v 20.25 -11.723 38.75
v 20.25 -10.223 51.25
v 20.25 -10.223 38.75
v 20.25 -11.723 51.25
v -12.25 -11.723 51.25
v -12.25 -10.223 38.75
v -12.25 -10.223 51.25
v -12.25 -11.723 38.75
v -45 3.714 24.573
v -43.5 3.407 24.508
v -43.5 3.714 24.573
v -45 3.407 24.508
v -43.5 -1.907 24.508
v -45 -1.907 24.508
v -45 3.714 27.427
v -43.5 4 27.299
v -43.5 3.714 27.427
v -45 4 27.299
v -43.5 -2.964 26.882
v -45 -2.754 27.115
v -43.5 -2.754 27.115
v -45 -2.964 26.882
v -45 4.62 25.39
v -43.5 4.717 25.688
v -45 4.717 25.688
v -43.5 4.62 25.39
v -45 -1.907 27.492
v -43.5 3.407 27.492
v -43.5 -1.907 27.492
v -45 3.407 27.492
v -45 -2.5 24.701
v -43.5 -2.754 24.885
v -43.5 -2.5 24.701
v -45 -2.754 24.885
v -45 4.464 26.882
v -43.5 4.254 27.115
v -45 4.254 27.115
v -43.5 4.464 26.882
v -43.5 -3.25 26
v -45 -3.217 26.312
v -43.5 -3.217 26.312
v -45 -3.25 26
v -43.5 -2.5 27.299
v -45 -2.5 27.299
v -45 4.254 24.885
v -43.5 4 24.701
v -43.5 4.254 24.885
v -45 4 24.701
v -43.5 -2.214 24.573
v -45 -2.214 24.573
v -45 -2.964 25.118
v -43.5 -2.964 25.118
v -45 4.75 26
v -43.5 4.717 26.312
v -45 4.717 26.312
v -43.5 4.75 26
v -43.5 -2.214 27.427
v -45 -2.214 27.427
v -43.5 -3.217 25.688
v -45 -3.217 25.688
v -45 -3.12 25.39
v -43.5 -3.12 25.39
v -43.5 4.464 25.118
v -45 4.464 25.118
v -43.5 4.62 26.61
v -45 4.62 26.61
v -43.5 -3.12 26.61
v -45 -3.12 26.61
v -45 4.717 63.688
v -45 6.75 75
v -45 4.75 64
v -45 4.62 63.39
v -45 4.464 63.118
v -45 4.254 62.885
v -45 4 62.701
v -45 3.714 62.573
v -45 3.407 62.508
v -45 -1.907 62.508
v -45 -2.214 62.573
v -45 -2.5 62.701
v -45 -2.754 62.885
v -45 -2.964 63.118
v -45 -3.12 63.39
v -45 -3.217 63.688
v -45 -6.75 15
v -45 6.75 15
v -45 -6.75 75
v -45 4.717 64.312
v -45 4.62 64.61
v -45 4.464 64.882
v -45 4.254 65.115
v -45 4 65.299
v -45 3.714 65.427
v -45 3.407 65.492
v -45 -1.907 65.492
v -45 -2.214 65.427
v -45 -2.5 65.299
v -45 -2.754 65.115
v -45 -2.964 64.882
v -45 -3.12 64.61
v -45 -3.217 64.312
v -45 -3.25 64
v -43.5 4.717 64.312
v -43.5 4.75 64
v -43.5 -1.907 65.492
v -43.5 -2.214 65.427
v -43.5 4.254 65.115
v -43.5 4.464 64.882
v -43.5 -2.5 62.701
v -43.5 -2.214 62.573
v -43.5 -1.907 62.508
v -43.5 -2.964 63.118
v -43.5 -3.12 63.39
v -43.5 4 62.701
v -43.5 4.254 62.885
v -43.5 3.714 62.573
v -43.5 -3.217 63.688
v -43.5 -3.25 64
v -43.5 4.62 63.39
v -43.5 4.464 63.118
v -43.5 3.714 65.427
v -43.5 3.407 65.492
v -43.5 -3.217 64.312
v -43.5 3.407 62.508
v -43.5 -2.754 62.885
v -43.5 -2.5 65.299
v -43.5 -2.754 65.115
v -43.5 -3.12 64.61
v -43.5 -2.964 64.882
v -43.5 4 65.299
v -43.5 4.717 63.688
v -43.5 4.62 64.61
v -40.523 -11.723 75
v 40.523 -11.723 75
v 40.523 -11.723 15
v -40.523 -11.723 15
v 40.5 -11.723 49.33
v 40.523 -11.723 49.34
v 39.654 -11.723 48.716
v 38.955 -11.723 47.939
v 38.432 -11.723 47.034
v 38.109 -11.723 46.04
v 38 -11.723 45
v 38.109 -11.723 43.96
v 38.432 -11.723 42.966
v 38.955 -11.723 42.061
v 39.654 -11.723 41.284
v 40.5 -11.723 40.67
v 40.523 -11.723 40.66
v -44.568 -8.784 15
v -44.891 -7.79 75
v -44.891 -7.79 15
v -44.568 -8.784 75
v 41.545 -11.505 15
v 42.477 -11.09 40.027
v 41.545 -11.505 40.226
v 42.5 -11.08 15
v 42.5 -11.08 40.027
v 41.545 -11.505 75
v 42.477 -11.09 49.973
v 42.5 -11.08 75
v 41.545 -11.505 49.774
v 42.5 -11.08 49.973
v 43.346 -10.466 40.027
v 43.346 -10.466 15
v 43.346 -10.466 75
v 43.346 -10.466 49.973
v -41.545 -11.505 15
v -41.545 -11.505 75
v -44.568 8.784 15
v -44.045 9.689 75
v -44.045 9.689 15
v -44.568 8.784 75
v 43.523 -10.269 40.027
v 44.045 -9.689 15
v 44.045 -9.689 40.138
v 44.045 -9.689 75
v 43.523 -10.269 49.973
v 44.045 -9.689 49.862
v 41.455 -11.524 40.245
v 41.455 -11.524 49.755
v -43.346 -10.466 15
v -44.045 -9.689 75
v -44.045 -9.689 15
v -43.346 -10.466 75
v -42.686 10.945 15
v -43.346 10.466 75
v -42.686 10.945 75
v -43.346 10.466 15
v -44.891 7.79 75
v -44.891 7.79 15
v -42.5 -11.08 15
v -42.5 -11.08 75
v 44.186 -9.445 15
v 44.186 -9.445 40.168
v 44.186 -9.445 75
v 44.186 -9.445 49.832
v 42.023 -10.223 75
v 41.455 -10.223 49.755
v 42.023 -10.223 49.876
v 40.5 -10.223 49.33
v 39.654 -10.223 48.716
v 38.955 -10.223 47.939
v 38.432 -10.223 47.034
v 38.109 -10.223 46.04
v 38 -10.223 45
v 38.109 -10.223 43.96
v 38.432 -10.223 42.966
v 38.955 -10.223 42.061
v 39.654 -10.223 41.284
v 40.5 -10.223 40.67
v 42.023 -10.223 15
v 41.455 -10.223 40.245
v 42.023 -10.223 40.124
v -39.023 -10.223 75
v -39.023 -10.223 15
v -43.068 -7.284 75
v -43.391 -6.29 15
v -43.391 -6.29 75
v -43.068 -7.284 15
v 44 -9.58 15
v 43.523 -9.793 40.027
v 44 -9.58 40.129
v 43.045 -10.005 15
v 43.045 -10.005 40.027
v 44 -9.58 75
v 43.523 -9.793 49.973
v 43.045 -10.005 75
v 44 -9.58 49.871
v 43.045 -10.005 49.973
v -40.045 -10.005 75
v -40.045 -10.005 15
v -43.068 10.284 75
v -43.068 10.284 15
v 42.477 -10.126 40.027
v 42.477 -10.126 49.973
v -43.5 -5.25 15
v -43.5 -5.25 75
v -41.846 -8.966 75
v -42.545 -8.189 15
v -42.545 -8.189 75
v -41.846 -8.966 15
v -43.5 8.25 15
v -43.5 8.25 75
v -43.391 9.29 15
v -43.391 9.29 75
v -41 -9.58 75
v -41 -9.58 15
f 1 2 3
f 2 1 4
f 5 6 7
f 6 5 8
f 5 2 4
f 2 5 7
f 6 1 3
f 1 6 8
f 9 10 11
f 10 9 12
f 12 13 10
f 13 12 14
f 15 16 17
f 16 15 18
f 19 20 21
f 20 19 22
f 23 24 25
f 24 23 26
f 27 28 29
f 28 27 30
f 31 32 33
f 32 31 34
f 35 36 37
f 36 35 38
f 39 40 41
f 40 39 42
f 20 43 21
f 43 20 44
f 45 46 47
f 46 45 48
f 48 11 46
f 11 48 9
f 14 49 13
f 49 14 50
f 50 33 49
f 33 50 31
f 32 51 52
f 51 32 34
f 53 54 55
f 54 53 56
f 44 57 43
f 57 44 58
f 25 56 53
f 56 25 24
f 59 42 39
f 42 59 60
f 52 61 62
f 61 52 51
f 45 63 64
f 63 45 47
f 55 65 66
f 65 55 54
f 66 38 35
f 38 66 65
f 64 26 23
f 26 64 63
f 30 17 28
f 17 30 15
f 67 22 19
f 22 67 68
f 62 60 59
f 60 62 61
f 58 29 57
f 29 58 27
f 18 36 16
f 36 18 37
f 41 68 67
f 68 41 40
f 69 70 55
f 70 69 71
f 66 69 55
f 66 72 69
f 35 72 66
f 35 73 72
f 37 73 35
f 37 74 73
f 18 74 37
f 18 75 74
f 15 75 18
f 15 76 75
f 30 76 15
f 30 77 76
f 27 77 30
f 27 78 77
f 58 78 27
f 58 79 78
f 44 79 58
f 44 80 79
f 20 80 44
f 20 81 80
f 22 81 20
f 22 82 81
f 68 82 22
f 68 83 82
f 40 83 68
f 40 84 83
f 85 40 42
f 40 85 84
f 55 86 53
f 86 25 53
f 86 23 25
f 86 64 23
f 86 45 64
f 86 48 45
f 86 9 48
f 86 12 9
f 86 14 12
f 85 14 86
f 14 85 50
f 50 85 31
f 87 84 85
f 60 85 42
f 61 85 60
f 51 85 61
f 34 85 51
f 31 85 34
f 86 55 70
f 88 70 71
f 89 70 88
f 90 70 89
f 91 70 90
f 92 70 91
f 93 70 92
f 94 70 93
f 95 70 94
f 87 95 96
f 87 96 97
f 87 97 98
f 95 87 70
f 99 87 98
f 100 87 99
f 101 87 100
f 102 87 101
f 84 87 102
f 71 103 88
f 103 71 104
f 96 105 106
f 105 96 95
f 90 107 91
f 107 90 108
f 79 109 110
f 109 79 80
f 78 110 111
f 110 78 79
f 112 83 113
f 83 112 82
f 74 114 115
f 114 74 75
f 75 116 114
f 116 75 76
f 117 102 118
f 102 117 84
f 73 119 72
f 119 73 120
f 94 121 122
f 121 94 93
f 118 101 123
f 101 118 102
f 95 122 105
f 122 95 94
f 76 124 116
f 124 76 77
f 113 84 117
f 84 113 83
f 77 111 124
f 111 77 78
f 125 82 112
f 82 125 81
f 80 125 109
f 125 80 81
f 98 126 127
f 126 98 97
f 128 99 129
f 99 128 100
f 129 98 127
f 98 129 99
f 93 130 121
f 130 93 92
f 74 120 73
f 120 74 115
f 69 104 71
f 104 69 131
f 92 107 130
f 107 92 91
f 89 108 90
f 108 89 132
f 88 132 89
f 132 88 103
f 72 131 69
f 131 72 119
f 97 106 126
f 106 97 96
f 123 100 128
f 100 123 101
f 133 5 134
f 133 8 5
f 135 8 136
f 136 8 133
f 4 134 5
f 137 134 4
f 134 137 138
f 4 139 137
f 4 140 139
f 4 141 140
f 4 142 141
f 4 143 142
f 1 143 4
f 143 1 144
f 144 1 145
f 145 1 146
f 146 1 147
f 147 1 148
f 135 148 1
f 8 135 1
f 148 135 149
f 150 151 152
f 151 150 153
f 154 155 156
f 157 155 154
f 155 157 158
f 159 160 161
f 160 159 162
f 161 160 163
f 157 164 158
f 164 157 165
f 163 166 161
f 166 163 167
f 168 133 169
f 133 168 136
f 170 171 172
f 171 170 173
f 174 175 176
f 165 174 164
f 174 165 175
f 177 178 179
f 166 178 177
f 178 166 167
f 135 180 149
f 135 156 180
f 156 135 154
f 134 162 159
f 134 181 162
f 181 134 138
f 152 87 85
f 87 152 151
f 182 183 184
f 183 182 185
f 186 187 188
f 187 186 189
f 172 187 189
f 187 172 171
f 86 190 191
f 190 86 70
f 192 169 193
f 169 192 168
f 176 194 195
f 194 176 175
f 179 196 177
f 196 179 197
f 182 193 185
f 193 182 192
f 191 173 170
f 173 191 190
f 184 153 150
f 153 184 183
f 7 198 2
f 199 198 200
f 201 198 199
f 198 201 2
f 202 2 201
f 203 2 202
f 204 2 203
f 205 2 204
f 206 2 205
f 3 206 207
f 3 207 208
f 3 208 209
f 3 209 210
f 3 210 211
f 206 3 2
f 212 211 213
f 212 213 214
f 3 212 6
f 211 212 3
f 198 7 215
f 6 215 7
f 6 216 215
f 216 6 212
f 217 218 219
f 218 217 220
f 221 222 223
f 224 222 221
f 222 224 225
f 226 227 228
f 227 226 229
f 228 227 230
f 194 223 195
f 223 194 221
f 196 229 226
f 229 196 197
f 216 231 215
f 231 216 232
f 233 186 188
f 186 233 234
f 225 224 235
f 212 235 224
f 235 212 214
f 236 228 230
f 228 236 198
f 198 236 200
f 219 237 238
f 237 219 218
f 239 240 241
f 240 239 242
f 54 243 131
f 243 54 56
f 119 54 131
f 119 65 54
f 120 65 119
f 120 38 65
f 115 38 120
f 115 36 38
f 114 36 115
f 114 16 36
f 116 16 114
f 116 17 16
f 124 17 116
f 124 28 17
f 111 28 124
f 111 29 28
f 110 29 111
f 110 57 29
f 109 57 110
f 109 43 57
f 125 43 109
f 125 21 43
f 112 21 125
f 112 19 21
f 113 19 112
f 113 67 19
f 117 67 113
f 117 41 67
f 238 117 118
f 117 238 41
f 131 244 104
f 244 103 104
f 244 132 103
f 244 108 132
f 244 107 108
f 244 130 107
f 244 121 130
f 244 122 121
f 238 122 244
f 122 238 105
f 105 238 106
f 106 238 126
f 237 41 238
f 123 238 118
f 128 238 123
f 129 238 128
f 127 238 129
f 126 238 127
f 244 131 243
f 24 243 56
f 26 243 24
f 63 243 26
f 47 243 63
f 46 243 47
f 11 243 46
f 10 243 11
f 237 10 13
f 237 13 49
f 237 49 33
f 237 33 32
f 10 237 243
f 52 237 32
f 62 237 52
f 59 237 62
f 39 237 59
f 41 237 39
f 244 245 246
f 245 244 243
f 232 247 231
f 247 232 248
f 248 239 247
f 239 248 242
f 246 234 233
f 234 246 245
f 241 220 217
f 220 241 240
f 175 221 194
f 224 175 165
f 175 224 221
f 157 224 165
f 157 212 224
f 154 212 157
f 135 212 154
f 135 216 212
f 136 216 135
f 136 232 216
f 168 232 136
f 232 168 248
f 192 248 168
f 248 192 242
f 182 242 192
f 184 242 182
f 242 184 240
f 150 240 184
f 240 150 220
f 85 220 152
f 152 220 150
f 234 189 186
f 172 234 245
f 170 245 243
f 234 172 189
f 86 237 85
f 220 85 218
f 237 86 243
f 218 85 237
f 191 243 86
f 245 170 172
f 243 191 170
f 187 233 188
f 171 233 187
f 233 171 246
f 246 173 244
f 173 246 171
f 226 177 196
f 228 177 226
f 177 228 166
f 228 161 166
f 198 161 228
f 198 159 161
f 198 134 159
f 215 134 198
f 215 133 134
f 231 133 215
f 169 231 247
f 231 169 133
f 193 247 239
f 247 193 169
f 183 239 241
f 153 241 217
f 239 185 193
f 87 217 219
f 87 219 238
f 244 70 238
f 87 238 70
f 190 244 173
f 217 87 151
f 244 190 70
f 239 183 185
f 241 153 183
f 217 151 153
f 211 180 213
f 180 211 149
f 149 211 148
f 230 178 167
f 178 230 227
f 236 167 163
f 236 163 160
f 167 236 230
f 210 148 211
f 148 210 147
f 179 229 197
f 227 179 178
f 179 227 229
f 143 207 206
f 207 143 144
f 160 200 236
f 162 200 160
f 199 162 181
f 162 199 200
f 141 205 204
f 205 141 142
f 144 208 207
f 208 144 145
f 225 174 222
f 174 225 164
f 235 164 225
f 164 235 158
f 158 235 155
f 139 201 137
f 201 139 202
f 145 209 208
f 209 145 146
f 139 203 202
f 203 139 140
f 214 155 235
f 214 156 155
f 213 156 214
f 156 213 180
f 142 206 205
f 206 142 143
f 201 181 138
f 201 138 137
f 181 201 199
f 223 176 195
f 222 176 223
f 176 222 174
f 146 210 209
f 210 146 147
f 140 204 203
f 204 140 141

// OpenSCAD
TRACKS = false;

SERVO_WIDTH = 12.5;
SERVO_LENGTH = 32.5;//23;
SERVO_OFFSET = 4;
SERVO_TAB_THICKNESS = 0;//2;
SERVO_MOUNT_HOLE_DIA = 1.5;
SERVO_MOUNT_HOLE_SPACING = 27;

WIDTH = 90;
LENGTH = 90;
THICKNESS = TRACKS ? 3 : 1.5;
HEIGHT = 22 + SERVO_TAB_THICKNESS + THICKNESS;

CORNER_DIA = 10;

TRACK_WIDTH = 15;
TRACK_THICKNESS = TRACKS ? 1.5 : 0;

THETHER_DIA = 10;
THETHER_OFFSET = -2;

SLOT_WIDTH = 3;
SLOT_LENGTH = 5;
SLOT_SPACING = 38;

SLOT_OFFSET = (HEIGHT-22)/2;

$fn = 30;


module rounded_rect(width, length, height, corner_dia) {
  hull() {
    for(i = [-1, 1]) {
      for(j = [-1, 1]) {
        translate([i * (length - corner_dia)/2, j * (width - corner_dia)/2, 0])
        cylinder(d = corner_dia, h = height);
      }
    }
  }
}

module thether() {
  rotate([90, 0, 0])
  cylinder(d = THETHER_DIA, h = HEIGHT, center = true);
}

module servo() {
  rotate([90, 0, 0]) {
    cube(size = [SERVO_LENGTH, SERVO_WIDTH, HEIGHT], center = true);
    translate([-SERVO_MOUNT_HOLE_SPACING/2, 0, 0])
    cylinder(d = SERVO_MOUNT_HOLE_DIA, h = HEIGHT, center = true);
    translate([SERVO_MOUNT_HOLE_SPACING/2, 0, 0])
    cylinder(d = SERVO_MOUNT_HOLE_DIA, h = HEIGHT, center = true);
  }
}

module slots() {
  rotate([90, 0, 90]) {
    for(i = [-1, 1]) {
      translate([0, i * SLOT_SPACING/2, 0])
      hull() {
        translate([-SLOT_LENGTH/2, 0, 0])
        cylinder(d = SLOT_WIDTH, h = THICKNESS * 2);
        translate([SLOT_LENGTH/2, 0, 0])
        cylinder(d = SLOT_WIDTH, h = THICKNESS * 2);
      }
    }
  }
}

module cover() {
  difference() {
    rounded_rect(HEIGHT, LENGTH, WIDTH, CORNER_DIA);

    translate([THICKNESS, THICKNESS, 0])
    rounded_rect(HEIGHT, LENGTH, WIDTH, CORNER_DIA);

    translate([0, TRACK_THICKNESS, 0])
    rounded_rect(HEIGHT, LENGTH, TRACK_WIDTH, CORNER_DIA);

    translate([0, TRACK_THICKNESS, WIDTH - TRACK_WIDTH])
    rounded_rect(HEIGHT, LENGTH, TRACK_WIDTH, CORNER_DIA);

    #translate([LENGTH/2 + THETHER_OFFSET, -HEIGHT/2, WIDTH/2])
    thether();

    #translate([SERVO_OFFSET, -HEIGHT/2, WIDTH/2])
    servo();

    #translate([-LENGTH/2, SLOT_OFFSET, WIDTH/2])
    slots();
  }
}

cover();
